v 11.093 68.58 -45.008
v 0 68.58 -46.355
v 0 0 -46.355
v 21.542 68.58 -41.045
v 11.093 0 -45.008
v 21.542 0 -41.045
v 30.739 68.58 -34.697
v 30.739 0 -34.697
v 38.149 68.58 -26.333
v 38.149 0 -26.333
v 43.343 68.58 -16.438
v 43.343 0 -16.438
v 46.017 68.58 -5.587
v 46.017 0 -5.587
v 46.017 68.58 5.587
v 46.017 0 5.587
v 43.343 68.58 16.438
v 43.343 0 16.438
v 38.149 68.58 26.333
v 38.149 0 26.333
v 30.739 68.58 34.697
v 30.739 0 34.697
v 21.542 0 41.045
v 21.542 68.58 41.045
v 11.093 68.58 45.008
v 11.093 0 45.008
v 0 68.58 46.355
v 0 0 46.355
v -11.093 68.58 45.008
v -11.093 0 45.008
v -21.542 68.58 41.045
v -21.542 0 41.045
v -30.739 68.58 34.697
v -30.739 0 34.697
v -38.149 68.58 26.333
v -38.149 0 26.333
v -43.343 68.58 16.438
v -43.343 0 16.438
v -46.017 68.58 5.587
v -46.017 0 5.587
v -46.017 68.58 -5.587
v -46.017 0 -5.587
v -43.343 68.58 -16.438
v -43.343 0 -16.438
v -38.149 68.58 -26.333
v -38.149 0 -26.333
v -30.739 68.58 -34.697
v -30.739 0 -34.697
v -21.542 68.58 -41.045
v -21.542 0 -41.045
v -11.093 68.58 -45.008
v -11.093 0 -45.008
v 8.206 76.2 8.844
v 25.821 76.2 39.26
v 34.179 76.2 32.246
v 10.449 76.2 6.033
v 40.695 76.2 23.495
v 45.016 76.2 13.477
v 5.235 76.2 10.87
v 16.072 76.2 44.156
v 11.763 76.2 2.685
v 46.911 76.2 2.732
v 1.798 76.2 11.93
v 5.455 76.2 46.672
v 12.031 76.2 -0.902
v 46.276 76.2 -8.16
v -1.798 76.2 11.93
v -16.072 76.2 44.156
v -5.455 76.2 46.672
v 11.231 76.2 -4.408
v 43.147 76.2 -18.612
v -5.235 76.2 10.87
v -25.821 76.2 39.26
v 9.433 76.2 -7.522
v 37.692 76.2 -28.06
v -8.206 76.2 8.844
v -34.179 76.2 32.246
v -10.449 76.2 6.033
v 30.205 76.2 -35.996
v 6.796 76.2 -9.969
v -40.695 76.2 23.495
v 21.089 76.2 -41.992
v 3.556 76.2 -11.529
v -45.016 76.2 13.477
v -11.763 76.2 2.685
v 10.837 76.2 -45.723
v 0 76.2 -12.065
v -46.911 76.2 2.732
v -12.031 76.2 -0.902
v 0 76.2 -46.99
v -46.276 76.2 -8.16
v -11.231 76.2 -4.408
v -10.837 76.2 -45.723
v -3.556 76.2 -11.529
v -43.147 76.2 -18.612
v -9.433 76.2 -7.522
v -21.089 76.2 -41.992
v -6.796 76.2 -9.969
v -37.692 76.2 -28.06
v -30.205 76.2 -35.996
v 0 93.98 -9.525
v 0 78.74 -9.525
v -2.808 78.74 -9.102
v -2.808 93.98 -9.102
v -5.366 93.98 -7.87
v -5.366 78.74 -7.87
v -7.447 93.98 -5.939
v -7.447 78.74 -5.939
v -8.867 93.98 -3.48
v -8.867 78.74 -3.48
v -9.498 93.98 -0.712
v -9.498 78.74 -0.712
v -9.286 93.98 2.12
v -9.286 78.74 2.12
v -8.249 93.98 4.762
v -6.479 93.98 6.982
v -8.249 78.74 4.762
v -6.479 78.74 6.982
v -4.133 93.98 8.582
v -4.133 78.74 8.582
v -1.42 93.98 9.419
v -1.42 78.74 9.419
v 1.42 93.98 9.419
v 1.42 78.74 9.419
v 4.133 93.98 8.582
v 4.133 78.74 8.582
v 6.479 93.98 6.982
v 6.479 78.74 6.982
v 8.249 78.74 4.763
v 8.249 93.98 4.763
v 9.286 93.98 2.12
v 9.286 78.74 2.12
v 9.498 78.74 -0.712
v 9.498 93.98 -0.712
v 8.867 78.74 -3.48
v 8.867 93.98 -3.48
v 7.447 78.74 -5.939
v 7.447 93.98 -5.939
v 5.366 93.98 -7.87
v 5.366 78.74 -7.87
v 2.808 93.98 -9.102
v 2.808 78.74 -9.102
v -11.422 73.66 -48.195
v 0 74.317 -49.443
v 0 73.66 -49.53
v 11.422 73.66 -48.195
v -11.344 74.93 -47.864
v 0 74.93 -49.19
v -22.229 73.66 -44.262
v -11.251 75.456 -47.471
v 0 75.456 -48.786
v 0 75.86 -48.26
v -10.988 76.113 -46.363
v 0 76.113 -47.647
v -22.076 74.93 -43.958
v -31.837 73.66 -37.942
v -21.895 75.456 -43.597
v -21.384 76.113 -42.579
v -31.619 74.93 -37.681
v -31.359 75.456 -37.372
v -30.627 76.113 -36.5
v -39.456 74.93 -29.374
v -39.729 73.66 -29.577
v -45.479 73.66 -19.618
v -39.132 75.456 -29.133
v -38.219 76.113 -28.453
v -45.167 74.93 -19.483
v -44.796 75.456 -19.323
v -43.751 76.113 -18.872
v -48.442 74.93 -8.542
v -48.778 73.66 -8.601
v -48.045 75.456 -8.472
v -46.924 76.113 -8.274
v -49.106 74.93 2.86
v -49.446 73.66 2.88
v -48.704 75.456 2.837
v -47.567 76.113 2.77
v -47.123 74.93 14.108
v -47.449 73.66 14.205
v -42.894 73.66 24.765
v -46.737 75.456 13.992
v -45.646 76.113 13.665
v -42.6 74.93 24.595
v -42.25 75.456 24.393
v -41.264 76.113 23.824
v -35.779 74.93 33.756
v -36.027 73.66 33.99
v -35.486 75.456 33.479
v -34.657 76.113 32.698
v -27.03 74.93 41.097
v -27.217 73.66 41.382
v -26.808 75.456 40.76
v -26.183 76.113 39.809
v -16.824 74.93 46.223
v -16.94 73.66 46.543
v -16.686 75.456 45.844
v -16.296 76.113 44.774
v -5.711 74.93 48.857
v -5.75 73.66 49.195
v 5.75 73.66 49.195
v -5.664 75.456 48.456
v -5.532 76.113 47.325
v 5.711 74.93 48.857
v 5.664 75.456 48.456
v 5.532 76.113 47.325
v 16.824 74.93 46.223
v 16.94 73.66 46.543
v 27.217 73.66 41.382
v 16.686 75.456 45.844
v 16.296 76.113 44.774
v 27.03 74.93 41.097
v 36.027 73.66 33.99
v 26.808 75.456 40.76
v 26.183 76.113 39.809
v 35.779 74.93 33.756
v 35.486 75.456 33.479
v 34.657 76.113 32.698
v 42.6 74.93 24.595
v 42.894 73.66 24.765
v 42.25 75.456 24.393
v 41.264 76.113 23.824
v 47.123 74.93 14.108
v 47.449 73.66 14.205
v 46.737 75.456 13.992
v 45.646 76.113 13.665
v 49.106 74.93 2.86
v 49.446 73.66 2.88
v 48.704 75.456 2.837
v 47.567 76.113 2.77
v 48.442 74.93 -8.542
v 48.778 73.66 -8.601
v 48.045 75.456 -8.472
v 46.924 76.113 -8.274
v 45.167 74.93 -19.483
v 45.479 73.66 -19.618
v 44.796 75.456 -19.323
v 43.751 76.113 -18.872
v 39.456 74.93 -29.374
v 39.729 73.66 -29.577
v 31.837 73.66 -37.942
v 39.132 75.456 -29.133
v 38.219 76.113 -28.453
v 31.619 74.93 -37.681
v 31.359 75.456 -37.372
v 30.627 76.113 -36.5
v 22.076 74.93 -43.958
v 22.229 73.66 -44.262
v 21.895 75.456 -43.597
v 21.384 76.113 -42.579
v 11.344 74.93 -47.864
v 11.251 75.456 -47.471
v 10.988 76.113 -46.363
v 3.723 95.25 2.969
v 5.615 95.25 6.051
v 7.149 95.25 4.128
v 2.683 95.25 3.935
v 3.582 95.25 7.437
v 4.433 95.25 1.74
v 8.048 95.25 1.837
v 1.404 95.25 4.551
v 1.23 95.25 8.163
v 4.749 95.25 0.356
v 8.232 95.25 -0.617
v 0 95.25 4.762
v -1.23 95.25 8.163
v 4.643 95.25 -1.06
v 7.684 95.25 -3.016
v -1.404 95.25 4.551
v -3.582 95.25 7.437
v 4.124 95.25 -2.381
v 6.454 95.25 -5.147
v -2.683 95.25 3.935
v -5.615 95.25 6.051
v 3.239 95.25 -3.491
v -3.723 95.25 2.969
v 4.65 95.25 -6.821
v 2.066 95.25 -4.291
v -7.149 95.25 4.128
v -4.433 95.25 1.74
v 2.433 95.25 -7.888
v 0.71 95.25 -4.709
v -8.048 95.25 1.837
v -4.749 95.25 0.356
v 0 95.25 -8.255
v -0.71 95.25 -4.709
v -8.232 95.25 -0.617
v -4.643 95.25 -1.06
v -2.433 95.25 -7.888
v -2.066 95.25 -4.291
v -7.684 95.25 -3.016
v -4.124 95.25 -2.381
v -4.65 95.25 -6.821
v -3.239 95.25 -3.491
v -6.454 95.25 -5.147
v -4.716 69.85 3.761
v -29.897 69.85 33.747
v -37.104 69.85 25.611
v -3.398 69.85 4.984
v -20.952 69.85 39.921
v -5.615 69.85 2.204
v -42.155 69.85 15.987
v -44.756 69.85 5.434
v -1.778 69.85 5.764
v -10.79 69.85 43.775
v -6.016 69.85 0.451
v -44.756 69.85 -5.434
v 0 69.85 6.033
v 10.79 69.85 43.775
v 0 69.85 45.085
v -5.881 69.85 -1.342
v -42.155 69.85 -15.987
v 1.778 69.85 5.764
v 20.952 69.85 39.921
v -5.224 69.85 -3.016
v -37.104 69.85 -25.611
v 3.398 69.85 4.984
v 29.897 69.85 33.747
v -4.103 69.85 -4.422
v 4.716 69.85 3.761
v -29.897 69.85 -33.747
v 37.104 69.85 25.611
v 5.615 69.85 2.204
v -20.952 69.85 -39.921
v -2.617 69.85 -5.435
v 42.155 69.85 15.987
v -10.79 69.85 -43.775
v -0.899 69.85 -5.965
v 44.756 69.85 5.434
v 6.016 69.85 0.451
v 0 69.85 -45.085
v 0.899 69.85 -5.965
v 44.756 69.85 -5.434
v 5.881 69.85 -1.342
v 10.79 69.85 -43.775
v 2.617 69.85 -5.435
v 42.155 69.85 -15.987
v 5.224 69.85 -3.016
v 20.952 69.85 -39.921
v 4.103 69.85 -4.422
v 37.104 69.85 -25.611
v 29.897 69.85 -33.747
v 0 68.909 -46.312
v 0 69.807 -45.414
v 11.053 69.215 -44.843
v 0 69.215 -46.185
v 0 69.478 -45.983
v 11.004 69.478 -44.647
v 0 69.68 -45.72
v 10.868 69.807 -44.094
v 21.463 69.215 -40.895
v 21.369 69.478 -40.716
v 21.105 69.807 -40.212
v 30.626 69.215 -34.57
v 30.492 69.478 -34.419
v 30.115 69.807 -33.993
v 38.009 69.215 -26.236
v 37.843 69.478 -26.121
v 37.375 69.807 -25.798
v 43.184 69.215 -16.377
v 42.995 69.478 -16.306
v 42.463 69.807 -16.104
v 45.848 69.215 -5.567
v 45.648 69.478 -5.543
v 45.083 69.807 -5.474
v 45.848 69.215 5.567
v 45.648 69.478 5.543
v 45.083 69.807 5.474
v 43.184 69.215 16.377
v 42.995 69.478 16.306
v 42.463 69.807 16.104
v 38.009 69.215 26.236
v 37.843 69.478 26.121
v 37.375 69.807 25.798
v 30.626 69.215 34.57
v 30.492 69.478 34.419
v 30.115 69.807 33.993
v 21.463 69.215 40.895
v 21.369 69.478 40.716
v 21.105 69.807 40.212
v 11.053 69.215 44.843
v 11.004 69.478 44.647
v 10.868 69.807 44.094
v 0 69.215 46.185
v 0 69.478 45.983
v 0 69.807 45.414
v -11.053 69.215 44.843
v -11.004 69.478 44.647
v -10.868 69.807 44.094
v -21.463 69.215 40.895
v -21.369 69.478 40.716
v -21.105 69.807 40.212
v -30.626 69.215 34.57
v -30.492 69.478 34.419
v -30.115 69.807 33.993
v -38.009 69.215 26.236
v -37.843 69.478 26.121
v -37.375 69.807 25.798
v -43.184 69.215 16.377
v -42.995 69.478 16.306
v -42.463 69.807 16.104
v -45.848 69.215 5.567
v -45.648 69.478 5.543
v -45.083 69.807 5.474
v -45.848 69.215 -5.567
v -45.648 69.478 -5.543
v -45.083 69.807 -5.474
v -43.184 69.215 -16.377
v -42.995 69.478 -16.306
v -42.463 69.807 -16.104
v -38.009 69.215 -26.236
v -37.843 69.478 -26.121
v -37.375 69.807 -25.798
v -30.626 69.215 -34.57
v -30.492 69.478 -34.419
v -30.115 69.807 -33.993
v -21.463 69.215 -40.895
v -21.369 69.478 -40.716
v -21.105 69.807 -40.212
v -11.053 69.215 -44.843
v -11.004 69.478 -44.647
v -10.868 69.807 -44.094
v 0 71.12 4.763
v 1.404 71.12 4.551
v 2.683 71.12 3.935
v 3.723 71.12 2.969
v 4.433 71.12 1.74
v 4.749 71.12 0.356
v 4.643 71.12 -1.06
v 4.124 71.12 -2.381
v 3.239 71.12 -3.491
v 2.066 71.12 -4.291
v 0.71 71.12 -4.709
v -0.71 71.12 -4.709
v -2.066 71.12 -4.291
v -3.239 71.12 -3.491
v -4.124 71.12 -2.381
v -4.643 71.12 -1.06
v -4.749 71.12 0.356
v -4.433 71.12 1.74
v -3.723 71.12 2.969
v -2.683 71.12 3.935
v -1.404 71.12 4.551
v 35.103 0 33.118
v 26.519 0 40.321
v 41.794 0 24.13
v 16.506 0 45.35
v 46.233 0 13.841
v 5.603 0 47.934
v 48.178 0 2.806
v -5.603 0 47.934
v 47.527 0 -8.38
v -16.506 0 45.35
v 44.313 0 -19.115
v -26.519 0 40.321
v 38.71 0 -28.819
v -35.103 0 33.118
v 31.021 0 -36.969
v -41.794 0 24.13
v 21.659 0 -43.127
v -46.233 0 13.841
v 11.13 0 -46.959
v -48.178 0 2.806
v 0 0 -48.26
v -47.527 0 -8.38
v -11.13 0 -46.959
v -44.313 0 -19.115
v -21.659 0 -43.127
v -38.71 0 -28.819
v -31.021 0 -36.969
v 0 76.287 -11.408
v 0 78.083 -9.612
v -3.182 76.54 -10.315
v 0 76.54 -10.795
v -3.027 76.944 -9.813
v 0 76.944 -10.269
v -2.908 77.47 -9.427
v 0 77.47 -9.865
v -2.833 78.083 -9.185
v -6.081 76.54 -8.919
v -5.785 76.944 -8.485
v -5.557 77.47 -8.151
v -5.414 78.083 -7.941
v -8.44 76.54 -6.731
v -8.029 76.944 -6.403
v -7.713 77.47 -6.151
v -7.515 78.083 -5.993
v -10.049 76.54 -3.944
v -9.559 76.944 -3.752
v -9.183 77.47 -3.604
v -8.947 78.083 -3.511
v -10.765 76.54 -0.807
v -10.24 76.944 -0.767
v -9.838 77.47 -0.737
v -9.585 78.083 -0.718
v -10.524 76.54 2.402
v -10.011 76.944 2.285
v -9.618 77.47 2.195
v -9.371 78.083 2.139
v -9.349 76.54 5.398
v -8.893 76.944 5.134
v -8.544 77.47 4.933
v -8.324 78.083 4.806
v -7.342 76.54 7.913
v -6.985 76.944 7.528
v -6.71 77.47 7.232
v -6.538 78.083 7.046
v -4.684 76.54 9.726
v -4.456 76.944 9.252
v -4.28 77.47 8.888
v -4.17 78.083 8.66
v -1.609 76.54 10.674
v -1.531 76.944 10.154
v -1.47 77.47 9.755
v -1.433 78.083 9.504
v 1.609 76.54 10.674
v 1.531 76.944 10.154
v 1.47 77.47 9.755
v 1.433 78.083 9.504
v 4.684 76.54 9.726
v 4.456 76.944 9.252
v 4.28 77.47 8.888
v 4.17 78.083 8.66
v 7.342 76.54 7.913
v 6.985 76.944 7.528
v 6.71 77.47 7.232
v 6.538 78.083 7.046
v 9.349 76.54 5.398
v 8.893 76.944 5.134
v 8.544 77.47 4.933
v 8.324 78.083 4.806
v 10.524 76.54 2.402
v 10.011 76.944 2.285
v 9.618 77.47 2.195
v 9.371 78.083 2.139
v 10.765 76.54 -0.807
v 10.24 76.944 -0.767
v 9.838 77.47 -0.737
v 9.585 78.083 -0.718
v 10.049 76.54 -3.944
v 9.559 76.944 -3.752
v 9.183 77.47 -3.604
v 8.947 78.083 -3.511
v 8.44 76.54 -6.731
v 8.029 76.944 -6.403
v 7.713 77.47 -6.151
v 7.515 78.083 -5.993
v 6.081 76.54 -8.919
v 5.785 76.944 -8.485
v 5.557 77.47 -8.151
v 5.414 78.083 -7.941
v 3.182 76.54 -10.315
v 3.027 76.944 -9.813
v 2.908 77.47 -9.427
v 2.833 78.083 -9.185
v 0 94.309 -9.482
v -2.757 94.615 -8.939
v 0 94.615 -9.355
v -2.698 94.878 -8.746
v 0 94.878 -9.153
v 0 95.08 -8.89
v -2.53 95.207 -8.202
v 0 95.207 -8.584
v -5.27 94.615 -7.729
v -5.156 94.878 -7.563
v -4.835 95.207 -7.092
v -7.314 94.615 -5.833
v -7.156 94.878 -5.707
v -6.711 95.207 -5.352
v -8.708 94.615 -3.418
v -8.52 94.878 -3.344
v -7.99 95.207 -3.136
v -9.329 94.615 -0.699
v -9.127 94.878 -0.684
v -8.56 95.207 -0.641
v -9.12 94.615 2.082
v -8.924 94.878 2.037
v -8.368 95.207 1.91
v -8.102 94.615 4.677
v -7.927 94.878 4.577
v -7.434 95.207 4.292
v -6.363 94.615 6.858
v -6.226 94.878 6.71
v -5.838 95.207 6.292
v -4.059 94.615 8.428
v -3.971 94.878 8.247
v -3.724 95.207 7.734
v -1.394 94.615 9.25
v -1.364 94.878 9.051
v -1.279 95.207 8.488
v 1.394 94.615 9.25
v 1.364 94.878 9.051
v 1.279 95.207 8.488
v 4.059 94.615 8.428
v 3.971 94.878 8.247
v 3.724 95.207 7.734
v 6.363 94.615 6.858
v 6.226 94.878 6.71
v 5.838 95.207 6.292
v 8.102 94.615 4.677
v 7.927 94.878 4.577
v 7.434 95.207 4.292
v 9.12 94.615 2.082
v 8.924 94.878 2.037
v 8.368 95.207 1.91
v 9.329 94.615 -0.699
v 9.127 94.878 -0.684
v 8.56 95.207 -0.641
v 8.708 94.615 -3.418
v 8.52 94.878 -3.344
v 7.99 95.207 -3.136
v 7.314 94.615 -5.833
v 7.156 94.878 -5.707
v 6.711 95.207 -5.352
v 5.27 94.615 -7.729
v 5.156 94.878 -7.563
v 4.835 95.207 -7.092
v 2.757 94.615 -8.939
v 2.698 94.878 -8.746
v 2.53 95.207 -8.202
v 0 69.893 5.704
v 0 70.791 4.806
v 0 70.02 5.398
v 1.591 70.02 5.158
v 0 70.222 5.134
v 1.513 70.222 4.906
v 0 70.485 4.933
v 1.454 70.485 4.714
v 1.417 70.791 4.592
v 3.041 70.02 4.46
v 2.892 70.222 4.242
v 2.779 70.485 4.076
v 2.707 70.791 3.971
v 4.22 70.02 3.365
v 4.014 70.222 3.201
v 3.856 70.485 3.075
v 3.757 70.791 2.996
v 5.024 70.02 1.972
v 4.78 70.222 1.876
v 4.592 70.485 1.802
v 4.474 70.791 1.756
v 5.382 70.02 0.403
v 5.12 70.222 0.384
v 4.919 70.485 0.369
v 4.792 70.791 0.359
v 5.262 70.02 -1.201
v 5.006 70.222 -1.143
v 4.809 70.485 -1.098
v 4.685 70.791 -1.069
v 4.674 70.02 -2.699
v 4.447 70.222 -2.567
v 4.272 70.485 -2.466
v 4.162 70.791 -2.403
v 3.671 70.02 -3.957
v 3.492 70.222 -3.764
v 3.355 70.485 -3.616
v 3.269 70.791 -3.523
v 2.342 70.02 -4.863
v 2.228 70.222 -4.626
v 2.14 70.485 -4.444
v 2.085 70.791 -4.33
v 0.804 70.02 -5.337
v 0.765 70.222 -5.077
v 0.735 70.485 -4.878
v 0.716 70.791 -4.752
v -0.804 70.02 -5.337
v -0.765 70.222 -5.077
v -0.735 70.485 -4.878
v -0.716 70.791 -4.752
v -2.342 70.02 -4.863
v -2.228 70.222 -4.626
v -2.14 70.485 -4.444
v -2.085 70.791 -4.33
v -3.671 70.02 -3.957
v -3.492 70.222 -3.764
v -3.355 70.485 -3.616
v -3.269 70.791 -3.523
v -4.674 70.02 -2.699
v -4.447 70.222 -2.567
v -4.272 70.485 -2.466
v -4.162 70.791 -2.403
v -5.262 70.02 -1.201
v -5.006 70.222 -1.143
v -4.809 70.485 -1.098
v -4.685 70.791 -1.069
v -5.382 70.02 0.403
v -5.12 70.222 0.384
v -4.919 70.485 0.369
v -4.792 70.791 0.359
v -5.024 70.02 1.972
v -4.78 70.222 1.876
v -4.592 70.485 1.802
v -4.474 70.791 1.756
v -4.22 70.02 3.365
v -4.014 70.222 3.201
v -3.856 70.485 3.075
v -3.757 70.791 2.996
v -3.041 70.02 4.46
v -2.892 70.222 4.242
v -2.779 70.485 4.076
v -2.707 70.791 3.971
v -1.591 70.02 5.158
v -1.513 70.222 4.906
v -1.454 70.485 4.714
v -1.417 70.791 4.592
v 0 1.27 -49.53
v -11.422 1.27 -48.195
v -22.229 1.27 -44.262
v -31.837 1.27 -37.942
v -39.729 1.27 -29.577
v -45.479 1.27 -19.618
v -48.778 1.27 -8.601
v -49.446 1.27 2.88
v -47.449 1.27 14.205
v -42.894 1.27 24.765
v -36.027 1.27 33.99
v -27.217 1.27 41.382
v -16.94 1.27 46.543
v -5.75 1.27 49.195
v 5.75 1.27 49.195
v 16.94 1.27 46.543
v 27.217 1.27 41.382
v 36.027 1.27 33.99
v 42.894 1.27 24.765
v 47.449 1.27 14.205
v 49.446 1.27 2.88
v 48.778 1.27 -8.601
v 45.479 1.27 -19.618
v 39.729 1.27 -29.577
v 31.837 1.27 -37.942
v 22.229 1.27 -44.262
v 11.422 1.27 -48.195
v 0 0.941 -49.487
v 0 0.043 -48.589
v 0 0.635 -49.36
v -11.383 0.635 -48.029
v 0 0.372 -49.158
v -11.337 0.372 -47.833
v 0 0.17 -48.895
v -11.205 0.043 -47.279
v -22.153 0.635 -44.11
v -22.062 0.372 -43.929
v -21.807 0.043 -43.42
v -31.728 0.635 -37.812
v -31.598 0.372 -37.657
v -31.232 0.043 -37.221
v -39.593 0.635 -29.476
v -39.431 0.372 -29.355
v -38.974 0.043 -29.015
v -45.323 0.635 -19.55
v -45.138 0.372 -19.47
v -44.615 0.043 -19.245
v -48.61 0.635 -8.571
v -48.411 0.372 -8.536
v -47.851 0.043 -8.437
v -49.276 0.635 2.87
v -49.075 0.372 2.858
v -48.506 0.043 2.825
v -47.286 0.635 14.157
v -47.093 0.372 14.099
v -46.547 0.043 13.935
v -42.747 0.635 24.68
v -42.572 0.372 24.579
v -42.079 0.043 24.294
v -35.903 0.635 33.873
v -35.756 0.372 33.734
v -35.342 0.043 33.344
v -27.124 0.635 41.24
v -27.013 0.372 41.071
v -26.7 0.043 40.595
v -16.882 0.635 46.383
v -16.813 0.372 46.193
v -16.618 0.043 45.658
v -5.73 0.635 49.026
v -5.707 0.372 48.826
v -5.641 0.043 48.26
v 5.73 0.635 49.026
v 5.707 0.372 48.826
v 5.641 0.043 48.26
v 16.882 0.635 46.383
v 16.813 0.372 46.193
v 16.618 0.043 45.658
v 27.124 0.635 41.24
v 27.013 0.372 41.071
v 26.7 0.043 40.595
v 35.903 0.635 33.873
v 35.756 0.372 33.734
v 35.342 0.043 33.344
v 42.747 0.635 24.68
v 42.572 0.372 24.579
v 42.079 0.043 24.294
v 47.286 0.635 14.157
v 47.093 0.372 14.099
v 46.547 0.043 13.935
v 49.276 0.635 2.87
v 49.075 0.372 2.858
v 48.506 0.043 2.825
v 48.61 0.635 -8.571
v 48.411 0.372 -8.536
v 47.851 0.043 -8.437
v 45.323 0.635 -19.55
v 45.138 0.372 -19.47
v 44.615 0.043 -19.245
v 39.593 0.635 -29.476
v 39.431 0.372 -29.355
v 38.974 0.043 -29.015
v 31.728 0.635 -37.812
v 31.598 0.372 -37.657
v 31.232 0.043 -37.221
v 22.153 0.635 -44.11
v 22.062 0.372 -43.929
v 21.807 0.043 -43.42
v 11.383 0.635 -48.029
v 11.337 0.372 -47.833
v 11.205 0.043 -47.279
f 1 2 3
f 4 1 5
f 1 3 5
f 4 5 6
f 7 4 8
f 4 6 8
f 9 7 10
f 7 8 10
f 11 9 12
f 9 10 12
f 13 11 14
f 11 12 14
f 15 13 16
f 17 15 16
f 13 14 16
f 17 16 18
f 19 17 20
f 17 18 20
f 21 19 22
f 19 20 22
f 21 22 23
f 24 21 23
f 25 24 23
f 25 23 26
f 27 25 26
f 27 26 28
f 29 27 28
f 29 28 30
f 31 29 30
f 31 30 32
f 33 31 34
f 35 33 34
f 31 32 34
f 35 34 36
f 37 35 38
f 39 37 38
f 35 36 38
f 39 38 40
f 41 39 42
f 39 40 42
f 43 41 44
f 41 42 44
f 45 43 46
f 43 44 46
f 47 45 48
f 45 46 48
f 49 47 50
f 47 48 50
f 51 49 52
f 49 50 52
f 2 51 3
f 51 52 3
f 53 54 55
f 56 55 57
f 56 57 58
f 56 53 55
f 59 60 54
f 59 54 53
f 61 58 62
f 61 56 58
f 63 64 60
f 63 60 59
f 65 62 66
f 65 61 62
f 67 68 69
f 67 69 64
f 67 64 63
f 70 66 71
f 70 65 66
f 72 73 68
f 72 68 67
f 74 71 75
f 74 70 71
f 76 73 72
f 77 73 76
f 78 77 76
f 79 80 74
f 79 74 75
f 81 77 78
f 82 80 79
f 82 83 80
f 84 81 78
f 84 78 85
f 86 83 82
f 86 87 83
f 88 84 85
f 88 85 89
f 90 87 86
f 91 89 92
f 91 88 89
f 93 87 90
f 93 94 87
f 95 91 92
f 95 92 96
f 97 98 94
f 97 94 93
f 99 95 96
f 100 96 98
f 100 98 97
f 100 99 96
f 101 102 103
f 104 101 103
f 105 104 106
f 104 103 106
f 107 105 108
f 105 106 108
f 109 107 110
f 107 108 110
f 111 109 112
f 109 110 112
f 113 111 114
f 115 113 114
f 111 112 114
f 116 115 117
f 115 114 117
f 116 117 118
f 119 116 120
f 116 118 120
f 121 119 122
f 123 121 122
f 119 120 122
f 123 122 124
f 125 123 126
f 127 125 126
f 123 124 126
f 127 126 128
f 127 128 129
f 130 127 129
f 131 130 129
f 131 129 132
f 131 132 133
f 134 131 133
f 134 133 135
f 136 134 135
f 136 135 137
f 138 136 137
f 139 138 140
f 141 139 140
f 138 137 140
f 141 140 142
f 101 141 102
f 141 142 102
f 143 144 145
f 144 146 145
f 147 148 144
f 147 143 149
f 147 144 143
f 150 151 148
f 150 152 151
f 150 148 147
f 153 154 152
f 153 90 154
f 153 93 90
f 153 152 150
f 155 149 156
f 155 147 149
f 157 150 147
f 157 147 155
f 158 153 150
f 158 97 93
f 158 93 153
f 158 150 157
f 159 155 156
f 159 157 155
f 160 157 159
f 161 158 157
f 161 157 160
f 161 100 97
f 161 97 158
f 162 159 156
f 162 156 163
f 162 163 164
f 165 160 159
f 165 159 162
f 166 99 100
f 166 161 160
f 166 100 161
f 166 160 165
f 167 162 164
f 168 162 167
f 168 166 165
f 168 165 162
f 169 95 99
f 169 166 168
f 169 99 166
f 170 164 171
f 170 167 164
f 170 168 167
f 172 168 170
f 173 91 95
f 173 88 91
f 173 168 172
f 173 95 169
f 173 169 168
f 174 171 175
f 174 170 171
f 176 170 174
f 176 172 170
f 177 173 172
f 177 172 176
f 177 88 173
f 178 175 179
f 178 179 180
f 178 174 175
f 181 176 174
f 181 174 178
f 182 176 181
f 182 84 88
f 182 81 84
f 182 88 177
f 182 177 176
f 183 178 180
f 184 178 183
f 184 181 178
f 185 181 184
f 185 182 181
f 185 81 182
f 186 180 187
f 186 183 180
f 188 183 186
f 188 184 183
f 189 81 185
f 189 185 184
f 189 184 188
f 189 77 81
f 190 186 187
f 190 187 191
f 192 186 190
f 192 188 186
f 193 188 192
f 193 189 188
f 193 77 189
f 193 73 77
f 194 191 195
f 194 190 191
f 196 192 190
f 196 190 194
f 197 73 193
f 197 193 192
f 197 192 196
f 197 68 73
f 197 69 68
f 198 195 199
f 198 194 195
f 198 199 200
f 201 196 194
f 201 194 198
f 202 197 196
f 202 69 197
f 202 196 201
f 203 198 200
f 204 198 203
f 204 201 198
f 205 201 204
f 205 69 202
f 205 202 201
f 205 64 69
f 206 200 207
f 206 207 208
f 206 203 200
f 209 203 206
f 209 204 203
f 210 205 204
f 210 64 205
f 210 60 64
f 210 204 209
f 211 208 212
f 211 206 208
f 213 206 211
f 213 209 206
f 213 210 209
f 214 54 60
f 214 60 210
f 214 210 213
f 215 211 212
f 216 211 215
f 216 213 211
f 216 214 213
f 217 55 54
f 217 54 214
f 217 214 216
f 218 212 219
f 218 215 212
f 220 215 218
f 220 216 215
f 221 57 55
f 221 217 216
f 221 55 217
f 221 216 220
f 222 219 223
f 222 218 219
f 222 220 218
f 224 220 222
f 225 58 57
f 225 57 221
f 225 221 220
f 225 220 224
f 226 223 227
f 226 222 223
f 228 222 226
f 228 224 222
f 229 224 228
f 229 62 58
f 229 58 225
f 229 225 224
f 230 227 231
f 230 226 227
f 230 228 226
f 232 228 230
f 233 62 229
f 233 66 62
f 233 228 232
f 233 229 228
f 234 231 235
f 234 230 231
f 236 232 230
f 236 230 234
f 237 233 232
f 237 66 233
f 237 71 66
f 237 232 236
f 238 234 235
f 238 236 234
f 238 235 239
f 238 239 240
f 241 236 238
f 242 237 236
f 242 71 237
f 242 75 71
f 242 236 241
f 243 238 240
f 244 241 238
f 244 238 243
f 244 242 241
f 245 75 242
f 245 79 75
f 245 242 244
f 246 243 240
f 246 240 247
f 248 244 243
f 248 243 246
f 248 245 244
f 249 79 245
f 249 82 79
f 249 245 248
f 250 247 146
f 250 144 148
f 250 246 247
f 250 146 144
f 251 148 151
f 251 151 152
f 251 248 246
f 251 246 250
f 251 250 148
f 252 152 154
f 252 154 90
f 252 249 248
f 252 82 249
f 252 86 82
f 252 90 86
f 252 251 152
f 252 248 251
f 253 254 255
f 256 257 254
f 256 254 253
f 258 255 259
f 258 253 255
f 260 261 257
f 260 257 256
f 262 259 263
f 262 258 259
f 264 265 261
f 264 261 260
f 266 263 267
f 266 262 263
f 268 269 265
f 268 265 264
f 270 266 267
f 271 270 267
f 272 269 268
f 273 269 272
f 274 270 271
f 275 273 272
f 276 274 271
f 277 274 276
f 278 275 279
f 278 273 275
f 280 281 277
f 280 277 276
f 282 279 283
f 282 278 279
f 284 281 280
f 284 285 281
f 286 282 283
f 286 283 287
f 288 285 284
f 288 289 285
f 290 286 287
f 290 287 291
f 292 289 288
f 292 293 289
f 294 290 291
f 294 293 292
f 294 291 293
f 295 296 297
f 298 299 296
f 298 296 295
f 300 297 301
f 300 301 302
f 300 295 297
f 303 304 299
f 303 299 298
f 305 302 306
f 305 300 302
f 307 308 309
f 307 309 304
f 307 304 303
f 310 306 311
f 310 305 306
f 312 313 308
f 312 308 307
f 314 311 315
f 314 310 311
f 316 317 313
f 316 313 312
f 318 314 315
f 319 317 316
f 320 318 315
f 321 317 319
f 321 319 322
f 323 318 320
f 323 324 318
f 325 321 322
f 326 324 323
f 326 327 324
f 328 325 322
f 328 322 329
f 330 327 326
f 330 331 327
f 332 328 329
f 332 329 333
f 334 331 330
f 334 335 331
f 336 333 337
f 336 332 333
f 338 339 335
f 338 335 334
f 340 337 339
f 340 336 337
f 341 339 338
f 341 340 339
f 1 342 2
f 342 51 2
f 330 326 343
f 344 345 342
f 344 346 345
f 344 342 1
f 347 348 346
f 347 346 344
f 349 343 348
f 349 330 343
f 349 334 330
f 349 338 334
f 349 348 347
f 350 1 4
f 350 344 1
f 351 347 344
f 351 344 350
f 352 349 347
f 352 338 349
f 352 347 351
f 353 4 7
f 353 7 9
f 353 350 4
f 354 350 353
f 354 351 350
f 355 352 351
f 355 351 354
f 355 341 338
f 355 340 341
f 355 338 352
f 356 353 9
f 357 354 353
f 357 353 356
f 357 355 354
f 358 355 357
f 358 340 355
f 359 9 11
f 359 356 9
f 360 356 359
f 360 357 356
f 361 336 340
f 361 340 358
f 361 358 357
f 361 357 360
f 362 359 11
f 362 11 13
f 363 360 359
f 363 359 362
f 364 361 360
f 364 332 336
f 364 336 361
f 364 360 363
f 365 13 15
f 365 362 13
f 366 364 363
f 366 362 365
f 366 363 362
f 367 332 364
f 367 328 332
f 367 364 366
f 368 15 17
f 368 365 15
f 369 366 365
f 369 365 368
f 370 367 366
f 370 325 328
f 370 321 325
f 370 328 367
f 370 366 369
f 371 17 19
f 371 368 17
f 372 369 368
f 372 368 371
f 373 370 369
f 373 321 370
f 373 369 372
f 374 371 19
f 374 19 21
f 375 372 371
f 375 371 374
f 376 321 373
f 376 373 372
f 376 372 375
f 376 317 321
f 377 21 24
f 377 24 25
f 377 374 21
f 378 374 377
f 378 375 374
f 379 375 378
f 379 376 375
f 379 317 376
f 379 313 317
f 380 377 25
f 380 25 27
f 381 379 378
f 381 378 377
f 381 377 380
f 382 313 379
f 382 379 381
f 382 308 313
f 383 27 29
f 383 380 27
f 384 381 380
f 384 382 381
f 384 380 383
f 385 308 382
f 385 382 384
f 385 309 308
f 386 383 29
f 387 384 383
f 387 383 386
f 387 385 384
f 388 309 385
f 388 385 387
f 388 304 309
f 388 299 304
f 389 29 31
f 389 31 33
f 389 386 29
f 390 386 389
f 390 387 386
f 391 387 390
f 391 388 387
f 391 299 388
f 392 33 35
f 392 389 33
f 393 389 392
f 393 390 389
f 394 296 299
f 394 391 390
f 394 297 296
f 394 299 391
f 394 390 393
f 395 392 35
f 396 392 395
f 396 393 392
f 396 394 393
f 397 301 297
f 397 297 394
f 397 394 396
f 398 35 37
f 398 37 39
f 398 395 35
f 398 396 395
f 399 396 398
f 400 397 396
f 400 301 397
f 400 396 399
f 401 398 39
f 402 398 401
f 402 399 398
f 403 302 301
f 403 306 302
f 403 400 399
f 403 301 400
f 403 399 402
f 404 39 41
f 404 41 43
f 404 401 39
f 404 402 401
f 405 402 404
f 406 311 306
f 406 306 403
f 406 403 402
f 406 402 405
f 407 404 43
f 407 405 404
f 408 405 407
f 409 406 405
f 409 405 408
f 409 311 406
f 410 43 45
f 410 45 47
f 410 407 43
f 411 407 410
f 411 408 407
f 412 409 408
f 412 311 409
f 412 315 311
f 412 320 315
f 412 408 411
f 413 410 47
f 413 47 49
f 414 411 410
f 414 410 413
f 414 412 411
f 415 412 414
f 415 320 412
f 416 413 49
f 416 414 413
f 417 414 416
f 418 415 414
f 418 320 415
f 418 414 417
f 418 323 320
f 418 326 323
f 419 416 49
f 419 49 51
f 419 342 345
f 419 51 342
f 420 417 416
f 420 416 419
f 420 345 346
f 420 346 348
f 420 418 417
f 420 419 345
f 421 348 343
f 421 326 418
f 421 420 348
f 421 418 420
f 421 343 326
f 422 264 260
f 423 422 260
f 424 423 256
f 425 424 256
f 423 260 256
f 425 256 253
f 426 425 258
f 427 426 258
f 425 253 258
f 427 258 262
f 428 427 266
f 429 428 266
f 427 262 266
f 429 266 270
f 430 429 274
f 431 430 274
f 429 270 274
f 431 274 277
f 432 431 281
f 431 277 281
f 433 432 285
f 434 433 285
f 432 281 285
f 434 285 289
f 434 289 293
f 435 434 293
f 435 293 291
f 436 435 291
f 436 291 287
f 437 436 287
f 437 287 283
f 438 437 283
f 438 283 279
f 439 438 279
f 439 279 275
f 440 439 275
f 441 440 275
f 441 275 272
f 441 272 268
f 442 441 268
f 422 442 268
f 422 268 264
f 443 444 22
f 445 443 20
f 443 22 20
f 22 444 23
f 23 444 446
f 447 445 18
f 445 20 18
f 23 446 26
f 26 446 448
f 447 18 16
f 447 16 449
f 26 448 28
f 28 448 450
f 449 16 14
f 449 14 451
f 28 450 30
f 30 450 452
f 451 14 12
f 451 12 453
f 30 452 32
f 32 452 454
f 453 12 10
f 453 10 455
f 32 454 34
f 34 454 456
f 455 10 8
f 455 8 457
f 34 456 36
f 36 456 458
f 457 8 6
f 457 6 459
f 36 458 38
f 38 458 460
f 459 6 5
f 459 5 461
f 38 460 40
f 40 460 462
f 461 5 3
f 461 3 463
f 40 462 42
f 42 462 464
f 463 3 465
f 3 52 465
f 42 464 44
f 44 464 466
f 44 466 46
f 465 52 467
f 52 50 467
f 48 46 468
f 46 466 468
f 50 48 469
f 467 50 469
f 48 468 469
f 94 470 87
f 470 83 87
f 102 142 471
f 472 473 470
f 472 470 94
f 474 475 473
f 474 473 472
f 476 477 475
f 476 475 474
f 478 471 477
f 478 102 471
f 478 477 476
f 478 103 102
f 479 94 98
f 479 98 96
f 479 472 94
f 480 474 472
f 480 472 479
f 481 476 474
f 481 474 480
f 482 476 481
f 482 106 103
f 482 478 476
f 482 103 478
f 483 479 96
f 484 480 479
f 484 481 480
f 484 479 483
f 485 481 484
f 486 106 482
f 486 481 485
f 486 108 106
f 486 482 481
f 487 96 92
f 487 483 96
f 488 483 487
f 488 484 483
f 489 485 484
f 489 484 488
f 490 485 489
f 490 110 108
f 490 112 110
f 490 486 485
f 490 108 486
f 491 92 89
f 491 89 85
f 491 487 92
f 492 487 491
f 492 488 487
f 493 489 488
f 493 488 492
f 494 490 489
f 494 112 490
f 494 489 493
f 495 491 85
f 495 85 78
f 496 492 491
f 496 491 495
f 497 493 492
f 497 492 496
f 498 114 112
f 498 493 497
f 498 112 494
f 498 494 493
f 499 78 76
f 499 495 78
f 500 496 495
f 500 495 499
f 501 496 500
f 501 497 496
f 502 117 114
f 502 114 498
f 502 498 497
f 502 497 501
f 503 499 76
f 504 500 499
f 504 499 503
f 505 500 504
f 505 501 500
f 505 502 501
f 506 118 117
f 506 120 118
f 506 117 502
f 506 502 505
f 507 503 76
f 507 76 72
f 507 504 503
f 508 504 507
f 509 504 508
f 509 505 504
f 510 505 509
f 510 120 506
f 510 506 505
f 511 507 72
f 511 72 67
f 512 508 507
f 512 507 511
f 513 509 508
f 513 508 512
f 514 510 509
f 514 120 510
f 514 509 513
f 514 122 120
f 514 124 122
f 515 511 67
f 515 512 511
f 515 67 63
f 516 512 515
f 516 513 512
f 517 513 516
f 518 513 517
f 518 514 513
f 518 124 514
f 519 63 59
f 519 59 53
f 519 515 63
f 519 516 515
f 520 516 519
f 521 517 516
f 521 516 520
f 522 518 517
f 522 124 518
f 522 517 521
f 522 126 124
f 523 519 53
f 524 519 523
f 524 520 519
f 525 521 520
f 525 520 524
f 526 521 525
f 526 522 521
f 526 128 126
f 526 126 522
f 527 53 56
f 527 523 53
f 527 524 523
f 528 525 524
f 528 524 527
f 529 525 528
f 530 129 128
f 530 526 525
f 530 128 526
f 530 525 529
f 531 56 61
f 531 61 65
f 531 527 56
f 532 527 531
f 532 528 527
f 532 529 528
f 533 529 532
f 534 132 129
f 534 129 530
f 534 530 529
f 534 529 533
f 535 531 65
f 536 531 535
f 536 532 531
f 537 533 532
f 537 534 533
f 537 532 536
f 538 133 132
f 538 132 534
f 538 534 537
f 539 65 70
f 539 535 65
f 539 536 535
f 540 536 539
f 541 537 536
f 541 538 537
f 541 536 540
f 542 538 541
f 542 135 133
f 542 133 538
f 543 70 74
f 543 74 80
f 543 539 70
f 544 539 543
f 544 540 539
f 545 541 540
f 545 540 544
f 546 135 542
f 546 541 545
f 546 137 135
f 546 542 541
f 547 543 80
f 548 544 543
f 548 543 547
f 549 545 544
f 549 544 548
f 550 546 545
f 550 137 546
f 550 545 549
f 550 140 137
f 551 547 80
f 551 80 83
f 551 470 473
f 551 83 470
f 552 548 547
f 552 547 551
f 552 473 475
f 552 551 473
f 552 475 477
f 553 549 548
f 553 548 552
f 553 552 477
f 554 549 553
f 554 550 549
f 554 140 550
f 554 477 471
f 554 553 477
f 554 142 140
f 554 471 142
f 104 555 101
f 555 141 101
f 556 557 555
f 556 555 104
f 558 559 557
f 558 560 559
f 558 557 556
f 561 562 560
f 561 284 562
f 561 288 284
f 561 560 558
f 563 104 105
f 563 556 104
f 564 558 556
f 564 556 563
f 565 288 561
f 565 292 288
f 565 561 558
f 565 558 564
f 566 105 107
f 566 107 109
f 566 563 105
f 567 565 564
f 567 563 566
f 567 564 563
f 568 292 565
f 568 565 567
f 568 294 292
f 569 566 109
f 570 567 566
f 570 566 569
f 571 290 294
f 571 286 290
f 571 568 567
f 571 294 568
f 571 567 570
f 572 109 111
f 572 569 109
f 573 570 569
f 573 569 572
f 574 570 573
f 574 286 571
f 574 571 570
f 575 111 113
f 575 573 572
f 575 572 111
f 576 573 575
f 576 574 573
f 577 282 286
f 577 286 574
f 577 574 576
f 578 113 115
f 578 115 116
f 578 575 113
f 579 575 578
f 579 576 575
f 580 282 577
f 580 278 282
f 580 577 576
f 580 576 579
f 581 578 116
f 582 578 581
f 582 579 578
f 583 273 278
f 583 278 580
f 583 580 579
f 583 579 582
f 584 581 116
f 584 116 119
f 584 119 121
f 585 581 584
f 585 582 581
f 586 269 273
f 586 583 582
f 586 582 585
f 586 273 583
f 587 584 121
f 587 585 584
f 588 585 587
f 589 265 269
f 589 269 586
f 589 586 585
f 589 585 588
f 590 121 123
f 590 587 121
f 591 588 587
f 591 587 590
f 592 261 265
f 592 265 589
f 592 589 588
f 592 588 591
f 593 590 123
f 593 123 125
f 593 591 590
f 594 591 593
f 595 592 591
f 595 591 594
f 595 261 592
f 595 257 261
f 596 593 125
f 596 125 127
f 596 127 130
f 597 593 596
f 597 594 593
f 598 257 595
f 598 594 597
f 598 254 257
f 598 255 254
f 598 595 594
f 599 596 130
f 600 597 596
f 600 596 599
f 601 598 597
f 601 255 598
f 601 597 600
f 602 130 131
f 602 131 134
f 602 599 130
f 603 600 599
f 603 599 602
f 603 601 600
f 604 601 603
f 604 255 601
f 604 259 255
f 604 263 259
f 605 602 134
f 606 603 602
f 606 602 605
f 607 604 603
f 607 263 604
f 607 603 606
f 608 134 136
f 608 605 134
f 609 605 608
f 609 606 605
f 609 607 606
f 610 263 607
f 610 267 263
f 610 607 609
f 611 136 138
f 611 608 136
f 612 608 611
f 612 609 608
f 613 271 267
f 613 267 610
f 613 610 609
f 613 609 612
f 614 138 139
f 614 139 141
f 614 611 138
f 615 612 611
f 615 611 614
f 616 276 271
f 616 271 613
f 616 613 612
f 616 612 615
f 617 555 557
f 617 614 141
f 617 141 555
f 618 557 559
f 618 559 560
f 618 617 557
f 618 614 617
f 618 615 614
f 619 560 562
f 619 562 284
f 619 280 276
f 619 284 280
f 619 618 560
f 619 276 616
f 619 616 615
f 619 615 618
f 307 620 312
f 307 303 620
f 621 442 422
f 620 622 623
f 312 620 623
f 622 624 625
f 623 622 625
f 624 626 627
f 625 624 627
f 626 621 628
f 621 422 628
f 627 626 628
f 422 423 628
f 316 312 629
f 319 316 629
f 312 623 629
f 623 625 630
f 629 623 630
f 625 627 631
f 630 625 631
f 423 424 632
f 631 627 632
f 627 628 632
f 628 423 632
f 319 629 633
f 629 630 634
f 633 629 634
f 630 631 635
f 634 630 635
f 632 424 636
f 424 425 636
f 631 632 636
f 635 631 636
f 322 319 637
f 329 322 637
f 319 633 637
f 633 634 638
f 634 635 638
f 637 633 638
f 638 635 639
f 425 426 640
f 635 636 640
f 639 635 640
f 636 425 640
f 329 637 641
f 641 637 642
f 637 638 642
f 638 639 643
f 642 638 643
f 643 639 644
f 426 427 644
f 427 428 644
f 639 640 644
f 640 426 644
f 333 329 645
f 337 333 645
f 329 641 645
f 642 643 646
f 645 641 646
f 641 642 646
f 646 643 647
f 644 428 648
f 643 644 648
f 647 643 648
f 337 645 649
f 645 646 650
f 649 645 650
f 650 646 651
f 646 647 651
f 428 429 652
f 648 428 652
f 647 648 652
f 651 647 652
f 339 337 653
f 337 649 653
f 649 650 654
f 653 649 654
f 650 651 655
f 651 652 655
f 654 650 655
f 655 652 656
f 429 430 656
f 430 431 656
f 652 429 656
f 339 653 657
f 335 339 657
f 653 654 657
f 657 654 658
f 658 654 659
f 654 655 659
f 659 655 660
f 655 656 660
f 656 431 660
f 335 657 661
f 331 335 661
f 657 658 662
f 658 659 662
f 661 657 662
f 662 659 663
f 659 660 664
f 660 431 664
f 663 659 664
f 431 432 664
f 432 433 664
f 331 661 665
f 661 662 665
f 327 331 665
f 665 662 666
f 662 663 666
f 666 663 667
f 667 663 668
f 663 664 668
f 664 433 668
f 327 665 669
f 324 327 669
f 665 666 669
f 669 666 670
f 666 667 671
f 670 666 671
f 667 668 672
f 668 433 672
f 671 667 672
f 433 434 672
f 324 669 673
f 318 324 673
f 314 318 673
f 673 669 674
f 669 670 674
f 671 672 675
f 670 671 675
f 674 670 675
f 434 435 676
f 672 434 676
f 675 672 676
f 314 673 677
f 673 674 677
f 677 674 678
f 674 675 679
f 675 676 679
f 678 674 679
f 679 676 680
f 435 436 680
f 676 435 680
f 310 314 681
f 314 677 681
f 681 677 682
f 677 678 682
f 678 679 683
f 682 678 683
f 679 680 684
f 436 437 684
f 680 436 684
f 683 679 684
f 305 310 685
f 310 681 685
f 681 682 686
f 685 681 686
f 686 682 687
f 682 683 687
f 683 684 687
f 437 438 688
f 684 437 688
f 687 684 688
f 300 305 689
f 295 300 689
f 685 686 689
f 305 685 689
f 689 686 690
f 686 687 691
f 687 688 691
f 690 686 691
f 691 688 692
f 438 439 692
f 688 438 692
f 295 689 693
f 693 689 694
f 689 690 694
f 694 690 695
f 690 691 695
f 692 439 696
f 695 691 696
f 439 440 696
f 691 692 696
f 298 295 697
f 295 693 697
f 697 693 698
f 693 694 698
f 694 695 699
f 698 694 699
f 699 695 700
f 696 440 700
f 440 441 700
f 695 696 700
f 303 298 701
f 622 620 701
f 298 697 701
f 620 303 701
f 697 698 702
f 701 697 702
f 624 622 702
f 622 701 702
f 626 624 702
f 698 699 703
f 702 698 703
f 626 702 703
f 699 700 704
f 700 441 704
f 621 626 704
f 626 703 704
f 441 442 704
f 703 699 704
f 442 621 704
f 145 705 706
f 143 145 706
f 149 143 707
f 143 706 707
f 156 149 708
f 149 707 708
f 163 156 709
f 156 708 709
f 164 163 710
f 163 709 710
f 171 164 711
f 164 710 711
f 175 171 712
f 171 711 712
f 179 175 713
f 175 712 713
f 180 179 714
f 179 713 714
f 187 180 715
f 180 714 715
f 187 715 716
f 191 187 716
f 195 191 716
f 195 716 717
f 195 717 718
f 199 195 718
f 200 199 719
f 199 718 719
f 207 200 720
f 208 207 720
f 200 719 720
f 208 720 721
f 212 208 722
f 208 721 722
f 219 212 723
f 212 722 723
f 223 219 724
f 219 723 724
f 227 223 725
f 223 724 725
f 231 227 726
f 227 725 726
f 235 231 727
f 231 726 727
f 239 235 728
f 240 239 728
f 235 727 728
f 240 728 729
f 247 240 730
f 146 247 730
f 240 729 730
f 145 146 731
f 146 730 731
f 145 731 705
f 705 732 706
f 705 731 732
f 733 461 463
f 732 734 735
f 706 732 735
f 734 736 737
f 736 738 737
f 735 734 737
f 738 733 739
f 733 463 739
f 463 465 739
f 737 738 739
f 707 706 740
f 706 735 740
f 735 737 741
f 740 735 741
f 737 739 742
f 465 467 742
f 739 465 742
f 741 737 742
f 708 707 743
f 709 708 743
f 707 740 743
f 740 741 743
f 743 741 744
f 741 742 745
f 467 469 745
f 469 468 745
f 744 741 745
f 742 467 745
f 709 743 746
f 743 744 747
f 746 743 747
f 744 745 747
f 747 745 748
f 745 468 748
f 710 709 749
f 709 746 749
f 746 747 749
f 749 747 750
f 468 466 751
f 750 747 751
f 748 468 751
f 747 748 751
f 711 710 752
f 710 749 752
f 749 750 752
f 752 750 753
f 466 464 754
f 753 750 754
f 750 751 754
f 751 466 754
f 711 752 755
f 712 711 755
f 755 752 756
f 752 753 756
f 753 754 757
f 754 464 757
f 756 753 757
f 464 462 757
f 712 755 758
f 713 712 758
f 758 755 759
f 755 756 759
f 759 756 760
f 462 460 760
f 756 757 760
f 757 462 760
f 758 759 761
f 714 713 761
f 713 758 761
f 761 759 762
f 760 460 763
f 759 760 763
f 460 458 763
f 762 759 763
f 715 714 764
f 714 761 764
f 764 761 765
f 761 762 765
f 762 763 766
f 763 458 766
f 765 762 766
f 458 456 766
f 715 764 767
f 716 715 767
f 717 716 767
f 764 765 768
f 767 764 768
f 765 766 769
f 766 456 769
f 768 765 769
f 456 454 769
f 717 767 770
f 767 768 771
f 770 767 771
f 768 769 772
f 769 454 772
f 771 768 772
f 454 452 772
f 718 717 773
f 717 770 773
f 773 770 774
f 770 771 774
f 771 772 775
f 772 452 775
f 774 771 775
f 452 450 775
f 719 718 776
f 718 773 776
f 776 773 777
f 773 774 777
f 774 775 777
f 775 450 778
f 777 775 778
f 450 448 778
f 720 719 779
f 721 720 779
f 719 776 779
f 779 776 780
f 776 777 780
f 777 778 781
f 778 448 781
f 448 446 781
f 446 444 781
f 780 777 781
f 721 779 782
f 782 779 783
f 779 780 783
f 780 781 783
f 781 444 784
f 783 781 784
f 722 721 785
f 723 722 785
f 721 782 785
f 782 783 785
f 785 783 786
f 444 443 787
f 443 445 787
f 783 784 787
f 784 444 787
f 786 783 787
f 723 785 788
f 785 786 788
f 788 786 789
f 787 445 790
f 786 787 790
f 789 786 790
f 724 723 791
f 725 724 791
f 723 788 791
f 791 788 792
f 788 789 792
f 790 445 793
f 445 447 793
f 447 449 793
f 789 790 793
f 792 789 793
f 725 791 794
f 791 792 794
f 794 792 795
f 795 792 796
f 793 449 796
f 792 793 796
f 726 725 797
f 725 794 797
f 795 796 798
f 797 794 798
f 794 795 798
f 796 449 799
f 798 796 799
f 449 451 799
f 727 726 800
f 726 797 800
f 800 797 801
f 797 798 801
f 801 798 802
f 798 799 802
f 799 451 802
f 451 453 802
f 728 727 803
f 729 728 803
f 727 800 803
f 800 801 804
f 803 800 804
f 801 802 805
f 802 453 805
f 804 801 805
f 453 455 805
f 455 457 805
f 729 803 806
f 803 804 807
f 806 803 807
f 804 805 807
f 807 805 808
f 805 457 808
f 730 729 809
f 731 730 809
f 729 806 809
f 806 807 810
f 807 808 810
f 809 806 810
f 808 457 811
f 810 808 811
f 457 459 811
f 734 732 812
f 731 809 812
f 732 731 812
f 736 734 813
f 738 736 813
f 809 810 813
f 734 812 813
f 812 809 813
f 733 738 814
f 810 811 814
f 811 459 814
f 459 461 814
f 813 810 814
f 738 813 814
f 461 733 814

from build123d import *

# Parameters (mm, degrees)
SKETCH1_R           = 49.53
BOSS_EXTRUDE1_DEPTH = 76.2
SKETCH2_R           = 46.355
CUT_EXTRUDE1_DEPTH  = 69.85
SKETCH4_R           = 9.525
BOSS_EXTRUDE2_DEPTH = 19.05
CUT_EXTRUDE2_REACH  = 120.233
SKETCH5_R           = 4.7625
FILLET1_R           = 2.54
FILLET2_R           = 1.27
FILLET3_R           = 1.27


with BuildPart() as part:
    # Sketch1 → Boss-Extrude1 (new body)
    with BuildSketch(Plane(origin=(0, 0, 0), x_dir=(1, 0, 0), z_dir=(0, 1, 0))):
        with Locations(Location((0, 0, 0), (0, 0, 90))):
            Circle(SKETCH1_R)
    extrude(amount=BOSS_EXTRUDE1_DEPTH)

    # Sketch2 → Cut-Extrude1 (cut)
    with BuildSketch(Plane.XZ):
        with Locations(Location((0, 0, 0), (0, 0, 270))):
            Circle(SKETCH2_R)
    extrude(amount=-CUT_EXTRUDE1_DEPTH, mode=Mode.SUBTRACT)

    # Sketch4 → Boss-Extrude2 (add)
    with BuildSketch(Plane(origin=(0, 76.2, 0), x_dir=(1, 0, 0), z_dir=(0, 1, 0))):
        with Locations(Location((0, 0, 0), (0, 0, 90))):
            Circle(SKETCH4_R)
    extrude(amount=BOSS_EXTRUDE2_DEPTH)

    # Sketch5 → Cut-Extrude2 (cut, up to next)
    with BuildSketch(Plane(origin=(0, 95.25, 0), x_dir=(1, 0, 0), z_dir=(0, 1, 0)), mode=Mode.PRIVATE) as cut_extrude2_sk1:
        with Locations(Location((0, 0, 0), (0, 0, 270))):
            Circle(SKETCH5_R)
    cut_extrude2_tool1 = extrude(cut_extrude2_sk1.sketch, amount=-CUT_EXTRUDE2_REACH, mode=Mode.PRIVATE) & part.part
    add(cut_extrude2_tool1.solids().sort_by_distance((0, 95.25, 0))[0], mode=Mode.SUBTRACT)

    # Fillet1
    fillet1_edges = [part.edges().sort_by_distance(p)[0] for p in [
        (0, 76.2, 9.525),
        (0, 76.2, 49.53),
    ]]
    fillet(fillet1_edges, radius=FILLET1_R)

    # Fillet2
    fillet2_edges = [part.edges().sort_by_distance(p)[0] for p in [
        (0, 95.25, 9.525),
        (0, 0, 49.53),
    ]]
    fillet(fillet2_edges, radius=FILLET2_R)

    # Fillet3
    fillet3_edges = [part.edges().sort_by_distance(p)[0] for p in [
        (0, 69.85, -4.7625),
        (0, 69.85, 46.355),
    ]]
    fillet(fillet3_edges, radius=FILLET3_R)


solid = part.part
